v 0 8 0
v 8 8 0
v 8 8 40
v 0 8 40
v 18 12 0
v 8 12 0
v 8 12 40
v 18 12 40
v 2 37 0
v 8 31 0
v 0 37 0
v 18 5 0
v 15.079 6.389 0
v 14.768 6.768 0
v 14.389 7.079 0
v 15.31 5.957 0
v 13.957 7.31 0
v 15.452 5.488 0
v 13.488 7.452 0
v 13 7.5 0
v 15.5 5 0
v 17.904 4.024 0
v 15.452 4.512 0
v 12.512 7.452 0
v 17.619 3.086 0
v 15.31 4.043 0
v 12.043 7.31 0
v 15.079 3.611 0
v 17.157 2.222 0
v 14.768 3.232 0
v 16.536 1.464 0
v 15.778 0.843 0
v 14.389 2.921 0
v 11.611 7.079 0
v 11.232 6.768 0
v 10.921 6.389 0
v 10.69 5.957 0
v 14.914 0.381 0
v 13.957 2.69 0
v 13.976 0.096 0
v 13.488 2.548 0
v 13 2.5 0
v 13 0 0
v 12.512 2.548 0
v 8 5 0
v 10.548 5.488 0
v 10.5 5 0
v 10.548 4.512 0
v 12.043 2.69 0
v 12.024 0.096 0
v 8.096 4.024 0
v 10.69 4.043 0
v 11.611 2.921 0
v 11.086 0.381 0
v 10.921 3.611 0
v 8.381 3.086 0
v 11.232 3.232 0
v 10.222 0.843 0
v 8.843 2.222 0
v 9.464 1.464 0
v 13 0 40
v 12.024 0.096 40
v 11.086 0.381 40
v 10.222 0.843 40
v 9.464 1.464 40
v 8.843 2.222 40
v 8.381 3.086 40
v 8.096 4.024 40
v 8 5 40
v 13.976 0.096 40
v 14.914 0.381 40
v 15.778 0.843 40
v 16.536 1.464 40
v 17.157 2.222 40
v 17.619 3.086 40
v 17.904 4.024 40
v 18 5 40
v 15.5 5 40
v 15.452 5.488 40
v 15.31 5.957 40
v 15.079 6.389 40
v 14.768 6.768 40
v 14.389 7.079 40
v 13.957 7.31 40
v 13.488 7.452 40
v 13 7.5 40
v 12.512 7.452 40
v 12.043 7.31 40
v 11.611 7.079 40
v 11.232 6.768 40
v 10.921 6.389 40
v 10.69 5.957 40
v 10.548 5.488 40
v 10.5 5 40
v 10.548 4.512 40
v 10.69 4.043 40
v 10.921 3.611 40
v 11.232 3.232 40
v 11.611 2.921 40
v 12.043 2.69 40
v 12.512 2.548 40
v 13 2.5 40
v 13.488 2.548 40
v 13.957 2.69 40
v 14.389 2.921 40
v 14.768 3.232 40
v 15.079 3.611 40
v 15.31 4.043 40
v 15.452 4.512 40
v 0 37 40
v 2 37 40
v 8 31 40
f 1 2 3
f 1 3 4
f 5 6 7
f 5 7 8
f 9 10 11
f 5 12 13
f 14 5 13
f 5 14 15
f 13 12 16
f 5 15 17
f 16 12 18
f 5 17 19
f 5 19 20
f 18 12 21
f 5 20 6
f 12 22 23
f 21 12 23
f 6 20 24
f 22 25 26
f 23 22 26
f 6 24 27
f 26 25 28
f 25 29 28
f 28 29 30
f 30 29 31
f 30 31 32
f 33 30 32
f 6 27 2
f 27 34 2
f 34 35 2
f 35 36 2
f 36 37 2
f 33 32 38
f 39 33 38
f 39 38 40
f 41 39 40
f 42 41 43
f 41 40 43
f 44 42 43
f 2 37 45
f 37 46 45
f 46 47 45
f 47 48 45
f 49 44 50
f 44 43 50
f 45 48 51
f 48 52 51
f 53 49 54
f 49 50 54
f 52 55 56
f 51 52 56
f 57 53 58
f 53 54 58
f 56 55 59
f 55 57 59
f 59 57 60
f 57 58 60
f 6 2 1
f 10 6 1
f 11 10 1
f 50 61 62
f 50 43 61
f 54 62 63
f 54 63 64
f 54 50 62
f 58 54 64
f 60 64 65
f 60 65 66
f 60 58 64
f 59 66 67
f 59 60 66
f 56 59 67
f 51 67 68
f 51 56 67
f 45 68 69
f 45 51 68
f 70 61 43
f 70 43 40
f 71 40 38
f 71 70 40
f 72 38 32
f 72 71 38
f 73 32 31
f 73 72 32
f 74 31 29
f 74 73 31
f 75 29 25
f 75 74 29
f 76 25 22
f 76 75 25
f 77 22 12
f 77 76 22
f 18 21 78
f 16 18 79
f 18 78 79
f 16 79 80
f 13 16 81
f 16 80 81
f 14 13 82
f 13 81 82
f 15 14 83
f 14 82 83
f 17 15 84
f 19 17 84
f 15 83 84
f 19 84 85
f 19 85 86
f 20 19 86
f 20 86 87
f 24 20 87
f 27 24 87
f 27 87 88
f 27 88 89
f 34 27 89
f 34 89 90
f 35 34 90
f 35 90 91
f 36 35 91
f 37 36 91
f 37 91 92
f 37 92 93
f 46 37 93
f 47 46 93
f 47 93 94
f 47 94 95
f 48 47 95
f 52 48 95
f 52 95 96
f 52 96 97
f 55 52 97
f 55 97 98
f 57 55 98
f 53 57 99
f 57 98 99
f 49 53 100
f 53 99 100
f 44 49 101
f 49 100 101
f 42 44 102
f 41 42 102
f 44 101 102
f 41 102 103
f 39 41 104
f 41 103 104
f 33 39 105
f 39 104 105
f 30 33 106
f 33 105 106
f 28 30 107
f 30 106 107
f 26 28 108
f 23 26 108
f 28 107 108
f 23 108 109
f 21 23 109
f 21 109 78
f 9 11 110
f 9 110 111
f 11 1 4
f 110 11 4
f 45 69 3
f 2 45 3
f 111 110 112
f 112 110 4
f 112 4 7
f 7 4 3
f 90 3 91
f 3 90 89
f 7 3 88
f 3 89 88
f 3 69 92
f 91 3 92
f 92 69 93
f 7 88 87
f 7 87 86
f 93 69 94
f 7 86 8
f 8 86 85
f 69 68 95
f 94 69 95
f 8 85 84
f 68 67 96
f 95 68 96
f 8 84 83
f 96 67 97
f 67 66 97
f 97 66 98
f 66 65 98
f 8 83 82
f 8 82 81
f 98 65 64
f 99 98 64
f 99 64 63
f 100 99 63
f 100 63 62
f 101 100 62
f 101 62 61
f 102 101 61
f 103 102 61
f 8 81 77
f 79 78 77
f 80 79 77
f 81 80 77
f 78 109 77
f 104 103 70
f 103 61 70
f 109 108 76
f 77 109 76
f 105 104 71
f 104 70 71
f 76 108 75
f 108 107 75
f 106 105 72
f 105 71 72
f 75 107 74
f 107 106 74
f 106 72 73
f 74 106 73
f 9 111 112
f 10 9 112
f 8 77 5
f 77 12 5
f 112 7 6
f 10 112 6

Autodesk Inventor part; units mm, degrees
ref_plane "YZ Plane" through (0, 0, 0) normal (1, 0, 0) x (0, 1, 0)
ref_plane "XZ Plane" through (0, 0, 0) normal (0, 1, 0) x (-1, 0, 0)
ref_plane "XY Plane" through (0, 0, 0) normal (0, 0, 1) x (1, 0, 0)
sketch "Sketch1" plane through (0, 0, 0) normal (0, 0, 1) x (1, 0, 0)
  line L0 (0, 0) -> (18, 0)
  line L1 (18, 0) -> (18, 32)
  line L2 (18, 32) -> (0, 32)
  line L3 (0, 32) -> (0, 0)
  dimension "d0" = 18
  dimension "d1" = 32
extrude "Extrusion1" add sketch "Sketch1" along normal blind 40
sketch "Sketch2" plane through (0, 0, 40) normal (0, 0, 1) x (1, 0, 0)
  point P0 (0, 0)
sketch "Sketch3" plane through (0, 32, 0) normal (0, 1, 0) x (1, 0, 0)
  line L0 (18, -40) -> (8, -40)
  line L1 (8, -40) -> (8, 0)
  line L2 (8, 0) -> (18, 0)
  line L3 (18, 0) -> (18, -40)
  point P0 (0, 0)
  dimension "d4" = 10
  dimension "d5" = 40
extrude "Extrusion2" cut sketch "Sketch3" against normal blind 20
sketch "Sketch4" plane through (0, 0, 40) normal (0, 0, 1) x (1, 0, 0)
  line L0 (0, 32) -> (0, 0) projected
  line L1 (0, 0) -> (8, 0)
  line L2 (8, 0) -> (8, 8)
  line L3 (8, 8) -> (0, 8)
  line L4 (0, 8) -> (0, 0)
  dimension "d8" = 8
  dimension "d9" = 8
extrude "Extrusion3" cut sketch "Sketch4" against normal blind 40
fillet "Fillet1" radius 5 2 edges at (18, 0, 20) (8, 0, 20)
sketch "Sketch5" plane through (0, 0, 40) normal (0, 0, 1) x (1, 0, 0)
  arc A0 (8, 5) -> (18, 5) centre (13, 5) ccw projected
  circle A1 centre (13, 5) radius 2.5
  point P0 (0, 0)
  dimension "d13" = 5
extrude "Extrusion4" cut sketch "Sketch5" against normal blind 40
sketch "Sketch6" plane through (0, 32, 40) normal (0, 1, 0) x (1, 0, 0)
  line L0 (0, 0) -> (8, 0) projected
  line L1 (8, 0) -> (8, 40) projected
  line L2 (0, 0) -> (8, 0)
  line L3 (8, 0) -> (8, 40)
  line L4 (8, 40) -> (0, 40)
  line L5 (0, 40) -> (0, 0)
extrude "Extrusion5" add sketch "Sketch6" along normal blind 5
sketch "Sketch7" plane through (0, 0, 40) normal (0, 0, 1) x (1, 0, 0)
  line L0 (8, 37) -> (0, 37) projected
  line L1 (2, 37) -> (8, 31)
  line L2 (8, 37) -> (8, 12) projected
  point P0 (0, 0)
  dimension "d18" = 6
extrude "Extrusion6" cut sketch "Sketch7" against normal blind 40
properties part number "Hinge"
